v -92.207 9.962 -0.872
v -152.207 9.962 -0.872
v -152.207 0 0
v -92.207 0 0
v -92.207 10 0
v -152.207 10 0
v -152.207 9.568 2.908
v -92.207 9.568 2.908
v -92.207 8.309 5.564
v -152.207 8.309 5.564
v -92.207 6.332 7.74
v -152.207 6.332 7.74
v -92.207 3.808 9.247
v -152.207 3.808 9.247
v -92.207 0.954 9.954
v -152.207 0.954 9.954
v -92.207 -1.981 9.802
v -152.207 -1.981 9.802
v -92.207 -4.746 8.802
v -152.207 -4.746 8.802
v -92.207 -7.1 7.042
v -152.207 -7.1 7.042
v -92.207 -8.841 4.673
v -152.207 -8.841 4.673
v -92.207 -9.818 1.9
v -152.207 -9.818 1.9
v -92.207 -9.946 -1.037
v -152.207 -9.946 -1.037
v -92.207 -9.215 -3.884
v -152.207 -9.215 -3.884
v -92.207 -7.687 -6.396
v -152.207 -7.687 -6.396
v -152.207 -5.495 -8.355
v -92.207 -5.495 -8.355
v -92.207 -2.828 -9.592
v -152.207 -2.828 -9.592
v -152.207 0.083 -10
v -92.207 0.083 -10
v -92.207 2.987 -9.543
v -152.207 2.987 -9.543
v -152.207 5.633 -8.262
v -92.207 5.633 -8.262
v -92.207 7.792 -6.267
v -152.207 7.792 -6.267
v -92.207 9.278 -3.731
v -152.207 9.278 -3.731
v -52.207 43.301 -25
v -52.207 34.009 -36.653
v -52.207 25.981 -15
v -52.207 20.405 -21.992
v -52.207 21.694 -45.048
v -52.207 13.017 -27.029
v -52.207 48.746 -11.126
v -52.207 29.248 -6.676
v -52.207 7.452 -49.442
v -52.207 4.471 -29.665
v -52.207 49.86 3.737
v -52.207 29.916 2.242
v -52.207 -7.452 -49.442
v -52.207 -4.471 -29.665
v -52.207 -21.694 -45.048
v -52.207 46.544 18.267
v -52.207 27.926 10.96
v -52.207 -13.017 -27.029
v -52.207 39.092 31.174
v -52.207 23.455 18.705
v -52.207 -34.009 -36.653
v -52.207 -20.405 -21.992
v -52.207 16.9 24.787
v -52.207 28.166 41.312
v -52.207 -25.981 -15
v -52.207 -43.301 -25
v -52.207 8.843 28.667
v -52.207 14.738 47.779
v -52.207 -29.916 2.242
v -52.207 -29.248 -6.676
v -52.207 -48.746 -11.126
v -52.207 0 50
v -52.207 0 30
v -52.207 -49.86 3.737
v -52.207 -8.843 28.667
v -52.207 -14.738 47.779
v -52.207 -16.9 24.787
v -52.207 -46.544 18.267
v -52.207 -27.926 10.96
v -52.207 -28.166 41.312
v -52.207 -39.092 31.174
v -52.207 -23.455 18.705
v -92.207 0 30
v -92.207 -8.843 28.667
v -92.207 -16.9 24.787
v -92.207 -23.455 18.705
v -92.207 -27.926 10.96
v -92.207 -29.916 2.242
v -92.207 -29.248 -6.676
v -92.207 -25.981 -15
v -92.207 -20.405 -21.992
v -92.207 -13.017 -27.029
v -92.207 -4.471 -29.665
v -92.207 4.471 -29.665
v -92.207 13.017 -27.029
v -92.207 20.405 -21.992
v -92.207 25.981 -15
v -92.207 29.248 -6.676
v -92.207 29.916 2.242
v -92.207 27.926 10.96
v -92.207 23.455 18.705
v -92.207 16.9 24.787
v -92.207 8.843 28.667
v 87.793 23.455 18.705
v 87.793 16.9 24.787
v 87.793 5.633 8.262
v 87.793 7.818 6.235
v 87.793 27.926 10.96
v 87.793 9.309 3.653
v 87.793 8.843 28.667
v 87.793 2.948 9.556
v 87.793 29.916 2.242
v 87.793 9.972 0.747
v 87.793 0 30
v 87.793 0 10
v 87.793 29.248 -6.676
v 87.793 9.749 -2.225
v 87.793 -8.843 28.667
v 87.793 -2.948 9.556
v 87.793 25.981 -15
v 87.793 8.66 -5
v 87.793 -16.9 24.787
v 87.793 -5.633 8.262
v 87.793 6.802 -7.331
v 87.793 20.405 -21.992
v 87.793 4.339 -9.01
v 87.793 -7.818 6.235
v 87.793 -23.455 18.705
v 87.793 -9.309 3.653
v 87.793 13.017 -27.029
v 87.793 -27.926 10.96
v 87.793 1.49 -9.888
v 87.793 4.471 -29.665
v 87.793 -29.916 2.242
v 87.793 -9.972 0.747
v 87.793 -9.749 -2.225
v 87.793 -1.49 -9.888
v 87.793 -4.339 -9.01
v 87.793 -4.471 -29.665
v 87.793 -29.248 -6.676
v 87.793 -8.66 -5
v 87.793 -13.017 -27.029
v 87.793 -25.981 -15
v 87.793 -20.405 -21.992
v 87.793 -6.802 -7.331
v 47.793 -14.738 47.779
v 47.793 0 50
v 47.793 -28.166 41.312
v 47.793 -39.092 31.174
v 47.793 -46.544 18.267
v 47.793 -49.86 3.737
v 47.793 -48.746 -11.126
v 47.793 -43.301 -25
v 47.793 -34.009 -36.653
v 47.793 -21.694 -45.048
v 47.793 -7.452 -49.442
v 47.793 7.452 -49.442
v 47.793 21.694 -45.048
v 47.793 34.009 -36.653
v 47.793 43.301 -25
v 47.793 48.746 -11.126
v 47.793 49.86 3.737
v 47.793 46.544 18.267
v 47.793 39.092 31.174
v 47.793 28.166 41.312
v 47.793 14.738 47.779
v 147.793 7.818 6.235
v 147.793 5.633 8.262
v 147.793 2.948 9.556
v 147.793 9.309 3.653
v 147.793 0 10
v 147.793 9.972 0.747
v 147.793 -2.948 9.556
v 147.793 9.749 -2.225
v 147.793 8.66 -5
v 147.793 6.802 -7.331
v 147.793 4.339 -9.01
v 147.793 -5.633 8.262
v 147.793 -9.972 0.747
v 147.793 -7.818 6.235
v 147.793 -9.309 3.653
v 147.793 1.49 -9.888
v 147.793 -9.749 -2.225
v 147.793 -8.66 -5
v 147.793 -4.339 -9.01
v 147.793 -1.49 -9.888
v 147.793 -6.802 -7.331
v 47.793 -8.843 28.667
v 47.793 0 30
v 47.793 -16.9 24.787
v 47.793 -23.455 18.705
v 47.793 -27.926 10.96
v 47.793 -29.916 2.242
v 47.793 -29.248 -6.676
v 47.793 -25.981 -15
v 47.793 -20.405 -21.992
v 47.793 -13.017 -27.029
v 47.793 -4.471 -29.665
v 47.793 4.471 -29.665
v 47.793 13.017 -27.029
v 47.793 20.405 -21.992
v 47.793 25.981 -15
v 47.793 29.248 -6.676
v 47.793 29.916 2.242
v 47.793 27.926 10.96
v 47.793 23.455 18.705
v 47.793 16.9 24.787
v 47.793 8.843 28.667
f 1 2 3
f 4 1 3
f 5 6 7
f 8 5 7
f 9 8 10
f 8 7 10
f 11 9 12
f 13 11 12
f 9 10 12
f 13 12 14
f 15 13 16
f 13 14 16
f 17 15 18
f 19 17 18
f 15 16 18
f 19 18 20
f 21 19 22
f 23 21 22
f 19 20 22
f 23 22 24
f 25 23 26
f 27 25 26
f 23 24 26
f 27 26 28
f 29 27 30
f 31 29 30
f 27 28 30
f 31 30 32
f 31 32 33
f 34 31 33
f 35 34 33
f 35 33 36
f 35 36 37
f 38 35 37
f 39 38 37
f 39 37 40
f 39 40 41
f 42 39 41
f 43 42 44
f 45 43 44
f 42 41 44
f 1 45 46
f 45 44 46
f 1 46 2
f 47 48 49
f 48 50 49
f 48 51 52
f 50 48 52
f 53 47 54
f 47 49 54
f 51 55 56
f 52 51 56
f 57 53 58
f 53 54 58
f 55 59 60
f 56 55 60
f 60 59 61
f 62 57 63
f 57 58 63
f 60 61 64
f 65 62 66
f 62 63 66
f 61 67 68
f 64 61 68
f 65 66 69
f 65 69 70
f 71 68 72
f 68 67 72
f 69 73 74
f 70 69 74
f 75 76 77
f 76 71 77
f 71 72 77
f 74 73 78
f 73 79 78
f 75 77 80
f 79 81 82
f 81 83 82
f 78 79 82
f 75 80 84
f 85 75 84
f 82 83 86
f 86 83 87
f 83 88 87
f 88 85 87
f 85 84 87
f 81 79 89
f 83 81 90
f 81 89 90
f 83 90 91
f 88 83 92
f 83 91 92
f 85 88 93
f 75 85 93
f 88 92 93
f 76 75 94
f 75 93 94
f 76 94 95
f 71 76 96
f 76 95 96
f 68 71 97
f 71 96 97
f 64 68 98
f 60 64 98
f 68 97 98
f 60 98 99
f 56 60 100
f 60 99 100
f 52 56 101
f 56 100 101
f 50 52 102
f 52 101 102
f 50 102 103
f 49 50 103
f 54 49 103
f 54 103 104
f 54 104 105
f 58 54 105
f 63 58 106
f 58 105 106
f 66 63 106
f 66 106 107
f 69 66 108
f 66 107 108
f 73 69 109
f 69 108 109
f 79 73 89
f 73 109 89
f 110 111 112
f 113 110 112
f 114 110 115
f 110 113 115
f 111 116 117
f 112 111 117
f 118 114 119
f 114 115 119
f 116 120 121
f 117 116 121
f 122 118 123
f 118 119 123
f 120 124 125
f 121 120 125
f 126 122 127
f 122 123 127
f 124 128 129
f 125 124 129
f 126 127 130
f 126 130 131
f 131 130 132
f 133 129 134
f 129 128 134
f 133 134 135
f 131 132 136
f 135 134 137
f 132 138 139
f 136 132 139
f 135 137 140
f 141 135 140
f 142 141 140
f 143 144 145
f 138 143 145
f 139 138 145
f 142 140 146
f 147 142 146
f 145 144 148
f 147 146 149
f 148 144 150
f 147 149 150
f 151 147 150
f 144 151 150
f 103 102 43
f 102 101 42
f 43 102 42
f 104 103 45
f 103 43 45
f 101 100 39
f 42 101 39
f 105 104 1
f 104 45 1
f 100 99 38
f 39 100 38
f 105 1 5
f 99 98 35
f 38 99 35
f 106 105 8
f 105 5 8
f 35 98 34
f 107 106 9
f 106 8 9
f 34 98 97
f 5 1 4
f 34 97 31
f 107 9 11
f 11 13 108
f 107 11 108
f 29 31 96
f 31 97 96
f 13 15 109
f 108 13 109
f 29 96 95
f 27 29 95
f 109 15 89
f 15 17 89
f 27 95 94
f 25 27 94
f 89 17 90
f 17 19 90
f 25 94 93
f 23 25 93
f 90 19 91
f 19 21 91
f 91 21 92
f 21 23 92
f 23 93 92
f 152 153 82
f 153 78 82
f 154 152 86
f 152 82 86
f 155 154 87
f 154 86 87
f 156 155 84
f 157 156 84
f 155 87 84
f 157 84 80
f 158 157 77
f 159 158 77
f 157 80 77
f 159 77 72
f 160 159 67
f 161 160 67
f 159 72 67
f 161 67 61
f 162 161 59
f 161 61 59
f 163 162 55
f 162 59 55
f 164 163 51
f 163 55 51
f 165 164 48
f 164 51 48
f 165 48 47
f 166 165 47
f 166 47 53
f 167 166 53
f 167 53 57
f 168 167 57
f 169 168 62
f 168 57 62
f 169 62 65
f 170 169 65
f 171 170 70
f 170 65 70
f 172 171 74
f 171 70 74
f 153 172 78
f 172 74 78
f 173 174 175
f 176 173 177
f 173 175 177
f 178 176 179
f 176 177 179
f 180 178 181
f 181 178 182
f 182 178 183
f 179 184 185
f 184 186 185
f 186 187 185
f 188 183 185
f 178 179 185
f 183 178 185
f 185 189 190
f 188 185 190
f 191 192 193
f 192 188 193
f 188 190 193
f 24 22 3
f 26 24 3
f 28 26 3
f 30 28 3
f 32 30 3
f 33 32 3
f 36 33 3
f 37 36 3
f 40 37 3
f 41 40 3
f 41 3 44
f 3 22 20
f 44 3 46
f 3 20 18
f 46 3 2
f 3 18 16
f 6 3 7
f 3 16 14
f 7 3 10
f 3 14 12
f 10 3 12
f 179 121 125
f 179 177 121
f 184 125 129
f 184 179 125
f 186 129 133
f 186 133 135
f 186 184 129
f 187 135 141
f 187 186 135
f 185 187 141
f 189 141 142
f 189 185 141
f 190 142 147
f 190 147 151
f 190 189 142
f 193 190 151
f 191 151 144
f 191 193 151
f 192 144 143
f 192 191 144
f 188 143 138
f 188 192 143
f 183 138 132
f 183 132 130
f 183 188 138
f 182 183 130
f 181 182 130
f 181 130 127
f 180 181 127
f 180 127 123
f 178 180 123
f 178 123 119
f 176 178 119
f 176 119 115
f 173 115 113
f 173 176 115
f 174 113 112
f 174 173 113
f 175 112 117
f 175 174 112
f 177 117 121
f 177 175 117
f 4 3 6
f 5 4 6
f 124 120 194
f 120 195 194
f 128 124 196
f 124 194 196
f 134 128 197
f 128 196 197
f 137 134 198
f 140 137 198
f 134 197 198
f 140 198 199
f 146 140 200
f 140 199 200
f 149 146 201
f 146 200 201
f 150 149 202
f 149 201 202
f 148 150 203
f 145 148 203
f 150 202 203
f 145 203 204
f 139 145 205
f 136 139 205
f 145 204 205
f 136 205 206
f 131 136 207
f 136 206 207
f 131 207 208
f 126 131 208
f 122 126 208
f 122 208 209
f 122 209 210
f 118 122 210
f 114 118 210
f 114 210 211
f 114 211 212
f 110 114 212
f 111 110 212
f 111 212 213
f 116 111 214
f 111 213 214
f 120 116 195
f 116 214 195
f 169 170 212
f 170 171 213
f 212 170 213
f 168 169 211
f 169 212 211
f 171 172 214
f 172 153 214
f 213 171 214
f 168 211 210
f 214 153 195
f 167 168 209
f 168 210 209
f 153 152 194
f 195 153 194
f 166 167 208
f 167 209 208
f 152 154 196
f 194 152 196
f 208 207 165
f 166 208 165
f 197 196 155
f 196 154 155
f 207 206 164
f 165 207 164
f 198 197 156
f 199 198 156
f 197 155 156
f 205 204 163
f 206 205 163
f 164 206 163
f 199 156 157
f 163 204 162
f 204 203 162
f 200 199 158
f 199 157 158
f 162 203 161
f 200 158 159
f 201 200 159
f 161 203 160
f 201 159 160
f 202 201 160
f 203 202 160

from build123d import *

# Parameters (mm, degrees)
REVOLVE_THIN4_START = -152.206983034
REVOLVE_THIN4_DEPTH = 60
SKETCH1_7_W         = 60
SKETCH1_7_H         = 10


# Read off the part's stored shape, not the designer's step: Revolve-Thin4
with BuildPart() as part:
    # Revolve-Thin4 outline → Revolve-Thin4 (new body)
    with BuildSketch(Plane.YZ.offset(REVOLVE_THIN4_START)):
        with BuildLine():
            ThreePointArc((10, 0), (-9.990482216, 0.436193872), (9.961946981, -0.871557427))
            Line((9.961946981, -0.871557427), (0, 0))
            Line((0, 0), (10, 0))
        make_face()
    extrude(amount=REVOLVE_THIN4_DEPTH)

    # Sketch1<7> → Revolve2 (revolve)
    with BuildSketch(Plane.XY, mode=Mode.PRIVATE) as revolve2_sk:
        Polygon((-92.206983034, 10), (-92.206983034, 0), (-52.206983034, 0), (-52.206983034, 30), (-92.206983034, 30), align=None)
        Polygon((-52.206983034, 30), (-52.206983034, 0), (47.793016966, 0), (47.793016966, 30), (47.793016966, 50), (-52.206983034, 50), align=None)
        Polygon((47.793016966, 30), (47.793016966, 0), (87.793016966, 0), (87.793016966, 10), (87.793016966, 30), align=None)
        with Locations((117.793016966, 5)):
            Rectangle(SKETCH1_7_W, SKETCH1_7_H)
    revolve(revolve2_sk.sketch.rotate(Axis((-163.404059647, 0, 0), (1, 0, 0)), 90), axis=Axis((-163.404059647, 0, 0), (1, 0, 0)))


solid = part.part
